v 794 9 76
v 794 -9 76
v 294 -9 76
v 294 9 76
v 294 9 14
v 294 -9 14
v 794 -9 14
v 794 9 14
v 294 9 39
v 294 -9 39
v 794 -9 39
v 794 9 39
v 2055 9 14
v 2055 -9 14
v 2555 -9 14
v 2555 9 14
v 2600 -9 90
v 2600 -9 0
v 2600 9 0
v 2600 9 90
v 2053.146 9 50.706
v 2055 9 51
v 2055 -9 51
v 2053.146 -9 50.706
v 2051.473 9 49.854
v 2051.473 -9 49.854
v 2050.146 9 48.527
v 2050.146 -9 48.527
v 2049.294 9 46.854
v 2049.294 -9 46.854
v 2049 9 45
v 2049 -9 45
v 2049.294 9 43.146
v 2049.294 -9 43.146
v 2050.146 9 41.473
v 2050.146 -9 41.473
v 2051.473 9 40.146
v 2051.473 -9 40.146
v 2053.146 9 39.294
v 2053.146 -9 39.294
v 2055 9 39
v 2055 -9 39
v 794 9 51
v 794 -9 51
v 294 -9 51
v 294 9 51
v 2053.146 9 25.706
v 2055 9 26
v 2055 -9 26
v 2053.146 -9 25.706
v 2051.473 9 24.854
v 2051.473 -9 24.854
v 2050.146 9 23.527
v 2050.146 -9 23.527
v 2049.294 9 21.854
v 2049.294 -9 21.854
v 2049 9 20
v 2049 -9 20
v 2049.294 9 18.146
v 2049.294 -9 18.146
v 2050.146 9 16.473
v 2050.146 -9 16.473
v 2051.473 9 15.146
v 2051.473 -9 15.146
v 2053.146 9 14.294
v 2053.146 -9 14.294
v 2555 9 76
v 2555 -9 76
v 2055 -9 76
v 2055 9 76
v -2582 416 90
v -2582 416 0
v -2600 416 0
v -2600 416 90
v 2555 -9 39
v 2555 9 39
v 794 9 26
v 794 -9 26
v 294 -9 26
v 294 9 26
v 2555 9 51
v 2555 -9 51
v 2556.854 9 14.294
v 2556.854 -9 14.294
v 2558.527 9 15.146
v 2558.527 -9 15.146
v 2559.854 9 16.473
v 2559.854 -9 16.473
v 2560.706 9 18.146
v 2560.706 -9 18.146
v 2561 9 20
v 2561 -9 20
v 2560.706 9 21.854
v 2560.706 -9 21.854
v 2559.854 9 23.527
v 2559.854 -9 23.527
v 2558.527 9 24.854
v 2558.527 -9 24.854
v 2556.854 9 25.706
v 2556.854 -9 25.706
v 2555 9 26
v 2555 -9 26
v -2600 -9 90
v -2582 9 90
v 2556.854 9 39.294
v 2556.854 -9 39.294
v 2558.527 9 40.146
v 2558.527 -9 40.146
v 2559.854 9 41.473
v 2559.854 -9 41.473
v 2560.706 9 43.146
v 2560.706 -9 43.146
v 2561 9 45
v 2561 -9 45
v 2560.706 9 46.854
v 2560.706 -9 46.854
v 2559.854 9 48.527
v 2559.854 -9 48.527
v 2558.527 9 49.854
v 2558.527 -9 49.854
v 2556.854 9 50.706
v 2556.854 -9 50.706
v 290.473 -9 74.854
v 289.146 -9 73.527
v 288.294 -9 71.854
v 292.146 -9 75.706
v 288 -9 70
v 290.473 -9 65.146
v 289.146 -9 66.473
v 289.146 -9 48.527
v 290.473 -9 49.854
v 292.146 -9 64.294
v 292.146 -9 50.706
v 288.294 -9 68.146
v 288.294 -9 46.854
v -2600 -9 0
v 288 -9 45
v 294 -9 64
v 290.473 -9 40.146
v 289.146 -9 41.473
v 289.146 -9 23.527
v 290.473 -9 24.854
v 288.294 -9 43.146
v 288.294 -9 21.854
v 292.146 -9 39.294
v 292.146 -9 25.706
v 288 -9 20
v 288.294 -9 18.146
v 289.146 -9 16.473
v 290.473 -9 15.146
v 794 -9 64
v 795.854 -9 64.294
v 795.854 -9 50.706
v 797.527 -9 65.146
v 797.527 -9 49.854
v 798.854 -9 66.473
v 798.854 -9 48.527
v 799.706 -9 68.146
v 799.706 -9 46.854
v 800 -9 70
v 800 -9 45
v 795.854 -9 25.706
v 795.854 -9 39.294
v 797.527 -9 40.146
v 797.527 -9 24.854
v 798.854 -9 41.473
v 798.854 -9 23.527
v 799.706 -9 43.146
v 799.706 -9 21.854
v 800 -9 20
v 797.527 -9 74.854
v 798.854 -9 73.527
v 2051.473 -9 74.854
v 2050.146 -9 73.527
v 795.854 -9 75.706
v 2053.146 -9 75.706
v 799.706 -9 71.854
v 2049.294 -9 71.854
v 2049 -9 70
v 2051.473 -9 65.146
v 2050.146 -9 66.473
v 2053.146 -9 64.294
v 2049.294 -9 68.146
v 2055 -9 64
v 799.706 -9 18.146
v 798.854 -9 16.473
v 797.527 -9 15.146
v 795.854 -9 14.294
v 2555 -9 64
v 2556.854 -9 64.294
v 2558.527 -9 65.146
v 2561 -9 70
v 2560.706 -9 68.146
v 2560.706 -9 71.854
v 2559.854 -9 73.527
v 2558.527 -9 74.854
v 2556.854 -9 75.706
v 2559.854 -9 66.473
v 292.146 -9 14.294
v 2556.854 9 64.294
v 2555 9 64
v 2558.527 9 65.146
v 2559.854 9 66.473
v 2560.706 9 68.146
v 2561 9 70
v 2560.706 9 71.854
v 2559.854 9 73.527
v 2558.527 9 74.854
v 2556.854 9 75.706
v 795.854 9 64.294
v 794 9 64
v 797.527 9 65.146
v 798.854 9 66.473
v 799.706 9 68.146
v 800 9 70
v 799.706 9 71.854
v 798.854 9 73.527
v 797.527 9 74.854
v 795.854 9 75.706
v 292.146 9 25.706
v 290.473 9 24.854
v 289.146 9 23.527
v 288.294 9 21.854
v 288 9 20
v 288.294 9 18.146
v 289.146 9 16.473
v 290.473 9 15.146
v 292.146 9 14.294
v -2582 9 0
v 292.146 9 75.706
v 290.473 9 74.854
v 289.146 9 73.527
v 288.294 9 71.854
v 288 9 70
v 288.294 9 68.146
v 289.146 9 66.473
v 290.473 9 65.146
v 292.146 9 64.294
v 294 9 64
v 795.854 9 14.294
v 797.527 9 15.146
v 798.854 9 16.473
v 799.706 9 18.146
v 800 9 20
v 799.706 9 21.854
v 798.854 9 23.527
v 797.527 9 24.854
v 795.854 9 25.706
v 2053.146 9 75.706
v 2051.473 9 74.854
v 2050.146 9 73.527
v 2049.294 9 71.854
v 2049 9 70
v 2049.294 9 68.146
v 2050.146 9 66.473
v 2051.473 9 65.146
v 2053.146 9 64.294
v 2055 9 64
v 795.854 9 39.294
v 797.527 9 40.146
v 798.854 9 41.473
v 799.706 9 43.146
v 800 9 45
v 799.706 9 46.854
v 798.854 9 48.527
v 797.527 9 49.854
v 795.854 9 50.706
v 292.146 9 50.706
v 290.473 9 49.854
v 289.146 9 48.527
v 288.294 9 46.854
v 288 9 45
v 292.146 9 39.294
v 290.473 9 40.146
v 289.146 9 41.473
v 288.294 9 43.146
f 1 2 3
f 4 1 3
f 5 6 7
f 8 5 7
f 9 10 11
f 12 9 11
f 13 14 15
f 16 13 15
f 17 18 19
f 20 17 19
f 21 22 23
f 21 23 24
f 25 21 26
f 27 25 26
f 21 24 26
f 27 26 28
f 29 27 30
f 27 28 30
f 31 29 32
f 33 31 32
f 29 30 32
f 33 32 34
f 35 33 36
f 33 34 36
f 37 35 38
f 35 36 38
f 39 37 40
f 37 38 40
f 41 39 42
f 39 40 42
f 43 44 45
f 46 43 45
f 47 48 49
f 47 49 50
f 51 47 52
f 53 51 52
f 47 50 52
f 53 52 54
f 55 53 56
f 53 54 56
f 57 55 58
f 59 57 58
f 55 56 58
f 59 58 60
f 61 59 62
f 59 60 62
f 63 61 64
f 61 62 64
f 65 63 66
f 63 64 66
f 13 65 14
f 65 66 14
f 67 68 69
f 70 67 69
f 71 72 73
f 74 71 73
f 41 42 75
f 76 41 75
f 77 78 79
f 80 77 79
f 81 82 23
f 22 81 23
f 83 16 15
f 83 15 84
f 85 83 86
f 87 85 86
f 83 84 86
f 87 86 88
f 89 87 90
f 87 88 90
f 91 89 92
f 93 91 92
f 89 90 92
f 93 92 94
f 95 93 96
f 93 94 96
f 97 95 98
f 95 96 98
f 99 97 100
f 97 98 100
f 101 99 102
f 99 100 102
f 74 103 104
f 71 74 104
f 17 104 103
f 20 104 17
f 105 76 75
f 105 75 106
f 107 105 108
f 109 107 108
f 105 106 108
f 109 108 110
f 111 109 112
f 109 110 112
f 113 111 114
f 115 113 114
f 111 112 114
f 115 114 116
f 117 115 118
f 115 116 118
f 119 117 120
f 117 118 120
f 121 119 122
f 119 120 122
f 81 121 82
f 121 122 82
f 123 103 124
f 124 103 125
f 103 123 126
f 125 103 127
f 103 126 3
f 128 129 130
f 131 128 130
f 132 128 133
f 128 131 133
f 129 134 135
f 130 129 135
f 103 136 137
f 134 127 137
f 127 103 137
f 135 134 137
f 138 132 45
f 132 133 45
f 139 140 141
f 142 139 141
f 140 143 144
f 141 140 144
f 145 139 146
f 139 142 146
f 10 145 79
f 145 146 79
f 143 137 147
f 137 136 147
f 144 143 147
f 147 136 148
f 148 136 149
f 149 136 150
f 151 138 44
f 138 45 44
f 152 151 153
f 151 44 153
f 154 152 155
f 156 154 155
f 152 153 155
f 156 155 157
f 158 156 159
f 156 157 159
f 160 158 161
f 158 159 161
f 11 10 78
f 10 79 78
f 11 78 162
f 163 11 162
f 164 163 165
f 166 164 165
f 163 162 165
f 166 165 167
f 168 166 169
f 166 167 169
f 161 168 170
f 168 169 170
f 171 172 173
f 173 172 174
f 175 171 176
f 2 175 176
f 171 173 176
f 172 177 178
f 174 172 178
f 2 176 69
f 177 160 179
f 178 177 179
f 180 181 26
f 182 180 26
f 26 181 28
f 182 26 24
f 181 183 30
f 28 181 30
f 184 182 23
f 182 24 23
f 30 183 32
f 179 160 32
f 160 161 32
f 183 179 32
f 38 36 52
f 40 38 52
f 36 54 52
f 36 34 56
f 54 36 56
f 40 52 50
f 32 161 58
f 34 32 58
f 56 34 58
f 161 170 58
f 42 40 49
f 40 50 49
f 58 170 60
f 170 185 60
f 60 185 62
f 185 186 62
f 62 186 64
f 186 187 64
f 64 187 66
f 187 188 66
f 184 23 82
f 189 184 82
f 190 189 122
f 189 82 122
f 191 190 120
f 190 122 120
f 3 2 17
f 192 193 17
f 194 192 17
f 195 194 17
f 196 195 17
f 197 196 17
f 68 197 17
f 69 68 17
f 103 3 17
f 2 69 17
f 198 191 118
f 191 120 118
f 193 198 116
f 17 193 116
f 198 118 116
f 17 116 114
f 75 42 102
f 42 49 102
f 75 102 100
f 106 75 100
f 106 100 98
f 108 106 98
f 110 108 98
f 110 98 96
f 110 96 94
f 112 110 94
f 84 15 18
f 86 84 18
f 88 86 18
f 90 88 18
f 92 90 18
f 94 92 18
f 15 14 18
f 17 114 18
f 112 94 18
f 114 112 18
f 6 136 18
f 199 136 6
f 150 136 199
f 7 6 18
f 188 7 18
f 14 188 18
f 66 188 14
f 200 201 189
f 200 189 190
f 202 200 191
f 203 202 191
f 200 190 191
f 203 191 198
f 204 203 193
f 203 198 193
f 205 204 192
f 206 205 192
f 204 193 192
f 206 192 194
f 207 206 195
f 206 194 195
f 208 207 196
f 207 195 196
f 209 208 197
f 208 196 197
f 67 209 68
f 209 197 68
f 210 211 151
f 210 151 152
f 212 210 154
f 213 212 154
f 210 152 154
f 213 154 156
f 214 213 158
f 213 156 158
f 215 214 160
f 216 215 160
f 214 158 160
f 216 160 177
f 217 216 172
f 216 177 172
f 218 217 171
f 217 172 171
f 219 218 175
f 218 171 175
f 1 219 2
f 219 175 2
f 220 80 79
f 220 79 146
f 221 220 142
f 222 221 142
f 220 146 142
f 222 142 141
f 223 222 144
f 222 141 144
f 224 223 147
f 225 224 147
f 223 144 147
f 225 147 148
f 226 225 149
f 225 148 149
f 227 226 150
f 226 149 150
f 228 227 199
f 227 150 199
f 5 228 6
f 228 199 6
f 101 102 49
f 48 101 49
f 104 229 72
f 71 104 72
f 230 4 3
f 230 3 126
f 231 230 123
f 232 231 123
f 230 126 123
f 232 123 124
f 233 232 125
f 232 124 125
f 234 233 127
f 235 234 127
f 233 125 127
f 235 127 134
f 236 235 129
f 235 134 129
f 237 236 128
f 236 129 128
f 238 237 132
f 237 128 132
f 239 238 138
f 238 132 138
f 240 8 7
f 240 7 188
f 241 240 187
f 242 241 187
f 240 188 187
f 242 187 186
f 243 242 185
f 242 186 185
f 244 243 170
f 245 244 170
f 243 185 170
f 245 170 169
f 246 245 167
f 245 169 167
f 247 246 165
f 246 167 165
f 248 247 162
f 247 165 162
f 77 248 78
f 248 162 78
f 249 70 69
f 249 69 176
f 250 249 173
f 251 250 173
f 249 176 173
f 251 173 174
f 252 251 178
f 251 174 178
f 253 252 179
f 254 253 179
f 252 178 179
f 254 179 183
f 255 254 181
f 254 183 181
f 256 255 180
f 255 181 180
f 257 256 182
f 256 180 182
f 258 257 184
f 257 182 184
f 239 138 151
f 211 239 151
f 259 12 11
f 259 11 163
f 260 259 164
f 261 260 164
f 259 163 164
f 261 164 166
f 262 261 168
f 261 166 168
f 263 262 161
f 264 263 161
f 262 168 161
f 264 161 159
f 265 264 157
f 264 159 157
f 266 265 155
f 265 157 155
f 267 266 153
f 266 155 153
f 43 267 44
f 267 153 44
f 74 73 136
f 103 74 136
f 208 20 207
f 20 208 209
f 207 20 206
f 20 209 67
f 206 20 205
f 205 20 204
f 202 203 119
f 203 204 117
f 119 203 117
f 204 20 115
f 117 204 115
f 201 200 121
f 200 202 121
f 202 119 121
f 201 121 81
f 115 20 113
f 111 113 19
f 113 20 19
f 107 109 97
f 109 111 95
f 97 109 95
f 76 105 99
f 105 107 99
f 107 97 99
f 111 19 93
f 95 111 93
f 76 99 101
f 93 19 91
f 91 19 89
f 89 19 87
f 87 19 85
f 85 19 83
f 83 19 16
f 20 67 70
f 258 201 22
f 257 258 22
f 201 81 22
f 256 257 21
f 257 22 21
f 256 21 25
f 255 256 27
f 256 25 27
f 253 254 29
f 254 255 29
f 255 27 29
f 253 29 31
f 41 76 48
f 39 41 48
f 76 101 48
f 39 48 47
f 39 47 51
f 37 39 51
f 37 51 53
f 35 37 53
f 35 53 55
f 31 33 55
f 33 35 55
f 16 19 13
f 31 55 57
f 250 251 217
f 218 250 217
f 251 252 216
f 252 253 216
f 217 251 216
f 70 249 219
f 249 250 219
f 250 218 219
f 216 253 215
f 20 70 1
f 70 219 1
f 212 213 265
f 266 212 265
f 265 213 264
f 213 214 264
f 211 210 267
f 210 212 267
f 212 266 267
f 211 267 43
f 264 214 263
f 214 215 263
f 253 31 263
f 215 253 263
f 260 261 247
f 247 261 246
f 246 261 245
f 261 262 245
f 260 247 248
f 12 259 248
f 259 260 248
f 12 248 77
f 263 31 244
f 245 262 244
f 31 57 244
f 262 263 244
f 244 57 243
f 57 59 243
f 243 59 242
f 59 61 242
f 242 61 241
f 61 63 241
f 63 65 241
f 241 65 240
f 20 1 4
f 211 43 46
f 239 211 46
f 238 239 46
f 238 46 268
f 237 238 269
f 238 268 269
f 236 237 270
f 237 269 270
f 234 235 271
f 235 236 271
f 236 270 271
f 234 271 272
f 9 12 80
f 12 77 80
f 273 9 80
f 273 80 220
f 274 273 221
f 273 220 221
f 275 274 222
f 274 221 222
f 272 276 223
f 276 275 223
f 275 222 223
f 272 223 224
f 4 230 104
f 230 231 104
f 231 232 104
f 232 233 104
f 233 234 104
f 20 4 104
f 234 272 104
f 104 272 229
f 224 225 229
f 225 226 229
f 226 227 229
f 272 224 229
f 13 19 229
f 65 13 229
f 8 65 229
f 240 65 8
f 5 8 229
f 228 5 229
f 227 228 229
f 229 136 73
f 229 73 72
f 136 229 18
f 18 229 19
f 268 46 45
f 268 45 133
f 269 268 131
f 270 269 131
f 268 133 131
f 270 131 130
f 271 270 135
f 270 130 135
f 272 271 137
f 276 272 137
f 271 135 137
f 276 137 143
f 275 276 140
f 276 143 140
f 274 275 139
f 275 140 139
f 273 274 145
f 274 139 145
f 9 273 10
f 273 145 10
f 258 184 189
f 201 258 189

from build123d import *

# Parameters (mm, degrees)
F1_DEPTH = 90
F3_DEPTH = 18


with BuildPart() as f1:
    # F0 (on Top) → F1 (new body)
    with BuildSketch(Plane.XY):
        Polygon((2600, -9), (2600, 9), (-2582, 9), (-2582, 416), (-2600, 416), (-2600, 9), (-2600, -9), align=None)
    extrude(amount=F1_DEPTH)

    # F2 (on face) → F3 (cut)
    with BuildSketch(Plane.XZ.offset(9)):
        with BuildLine():
            Line((2555, 76), (2055, 76))
            ThreePointArc((2055, 76), (2049, 70), (2055, 64))
            Line((2055, 64), (2555, 64))
            ThreePointArc((2555, 64), (2561, 70), (2555, 76))
        make_face()
        with BuildLine():
            Line((2555, 51), (2055, 51))
            ThreePointArc((2055, 51), (2049, 45), (2055, 39))
            Line((2055, 39), (2555, 39))
            ThreePointArc((2555, 39), (2561, 45), (2555, 51))
        make_face()
        with BuildLine():
            Line((2555, 26), (2055, 26))
            ThreePointArc((2055, 26), (2049, 20), (2055, 14))
            Line((2055, 14), (2555, 14))
            ThreePointArc((2555, 14), (2561, 20), (2555, 26))
        make_face()
        with BuildLine():
            Line((794, 76), (294, 76))
            ThreePointArc((294, 76), (288, 70), (294, 64))
            Line((294, 64), (794, 64))
            ThreePointArc((794, 64), (800, 70), (794, 76))
        make_face()
        with BuildLine():
            Line((794, 51), (294, 51))
            ThreePointArc((294, 51), (288, 45), (294, 39))
            Line((294, 39), (794, 39))
            ThreePointArc((794, 39), (800, 45), (794, 51))
        make_face()
        with BuildLine():
            Line((794, 26), (294, 26))
            ThreePointArc((294, 26), (288, 20), (294, 14))
            Line((294, 14), (794, 14))
            ThreePointArc((794, 14), (800, 20), (794, 26))
        make_face()
    extrude(amount=-F3_DEPTH, mode=Mode.SUBTRACT)


solid = f1.part
